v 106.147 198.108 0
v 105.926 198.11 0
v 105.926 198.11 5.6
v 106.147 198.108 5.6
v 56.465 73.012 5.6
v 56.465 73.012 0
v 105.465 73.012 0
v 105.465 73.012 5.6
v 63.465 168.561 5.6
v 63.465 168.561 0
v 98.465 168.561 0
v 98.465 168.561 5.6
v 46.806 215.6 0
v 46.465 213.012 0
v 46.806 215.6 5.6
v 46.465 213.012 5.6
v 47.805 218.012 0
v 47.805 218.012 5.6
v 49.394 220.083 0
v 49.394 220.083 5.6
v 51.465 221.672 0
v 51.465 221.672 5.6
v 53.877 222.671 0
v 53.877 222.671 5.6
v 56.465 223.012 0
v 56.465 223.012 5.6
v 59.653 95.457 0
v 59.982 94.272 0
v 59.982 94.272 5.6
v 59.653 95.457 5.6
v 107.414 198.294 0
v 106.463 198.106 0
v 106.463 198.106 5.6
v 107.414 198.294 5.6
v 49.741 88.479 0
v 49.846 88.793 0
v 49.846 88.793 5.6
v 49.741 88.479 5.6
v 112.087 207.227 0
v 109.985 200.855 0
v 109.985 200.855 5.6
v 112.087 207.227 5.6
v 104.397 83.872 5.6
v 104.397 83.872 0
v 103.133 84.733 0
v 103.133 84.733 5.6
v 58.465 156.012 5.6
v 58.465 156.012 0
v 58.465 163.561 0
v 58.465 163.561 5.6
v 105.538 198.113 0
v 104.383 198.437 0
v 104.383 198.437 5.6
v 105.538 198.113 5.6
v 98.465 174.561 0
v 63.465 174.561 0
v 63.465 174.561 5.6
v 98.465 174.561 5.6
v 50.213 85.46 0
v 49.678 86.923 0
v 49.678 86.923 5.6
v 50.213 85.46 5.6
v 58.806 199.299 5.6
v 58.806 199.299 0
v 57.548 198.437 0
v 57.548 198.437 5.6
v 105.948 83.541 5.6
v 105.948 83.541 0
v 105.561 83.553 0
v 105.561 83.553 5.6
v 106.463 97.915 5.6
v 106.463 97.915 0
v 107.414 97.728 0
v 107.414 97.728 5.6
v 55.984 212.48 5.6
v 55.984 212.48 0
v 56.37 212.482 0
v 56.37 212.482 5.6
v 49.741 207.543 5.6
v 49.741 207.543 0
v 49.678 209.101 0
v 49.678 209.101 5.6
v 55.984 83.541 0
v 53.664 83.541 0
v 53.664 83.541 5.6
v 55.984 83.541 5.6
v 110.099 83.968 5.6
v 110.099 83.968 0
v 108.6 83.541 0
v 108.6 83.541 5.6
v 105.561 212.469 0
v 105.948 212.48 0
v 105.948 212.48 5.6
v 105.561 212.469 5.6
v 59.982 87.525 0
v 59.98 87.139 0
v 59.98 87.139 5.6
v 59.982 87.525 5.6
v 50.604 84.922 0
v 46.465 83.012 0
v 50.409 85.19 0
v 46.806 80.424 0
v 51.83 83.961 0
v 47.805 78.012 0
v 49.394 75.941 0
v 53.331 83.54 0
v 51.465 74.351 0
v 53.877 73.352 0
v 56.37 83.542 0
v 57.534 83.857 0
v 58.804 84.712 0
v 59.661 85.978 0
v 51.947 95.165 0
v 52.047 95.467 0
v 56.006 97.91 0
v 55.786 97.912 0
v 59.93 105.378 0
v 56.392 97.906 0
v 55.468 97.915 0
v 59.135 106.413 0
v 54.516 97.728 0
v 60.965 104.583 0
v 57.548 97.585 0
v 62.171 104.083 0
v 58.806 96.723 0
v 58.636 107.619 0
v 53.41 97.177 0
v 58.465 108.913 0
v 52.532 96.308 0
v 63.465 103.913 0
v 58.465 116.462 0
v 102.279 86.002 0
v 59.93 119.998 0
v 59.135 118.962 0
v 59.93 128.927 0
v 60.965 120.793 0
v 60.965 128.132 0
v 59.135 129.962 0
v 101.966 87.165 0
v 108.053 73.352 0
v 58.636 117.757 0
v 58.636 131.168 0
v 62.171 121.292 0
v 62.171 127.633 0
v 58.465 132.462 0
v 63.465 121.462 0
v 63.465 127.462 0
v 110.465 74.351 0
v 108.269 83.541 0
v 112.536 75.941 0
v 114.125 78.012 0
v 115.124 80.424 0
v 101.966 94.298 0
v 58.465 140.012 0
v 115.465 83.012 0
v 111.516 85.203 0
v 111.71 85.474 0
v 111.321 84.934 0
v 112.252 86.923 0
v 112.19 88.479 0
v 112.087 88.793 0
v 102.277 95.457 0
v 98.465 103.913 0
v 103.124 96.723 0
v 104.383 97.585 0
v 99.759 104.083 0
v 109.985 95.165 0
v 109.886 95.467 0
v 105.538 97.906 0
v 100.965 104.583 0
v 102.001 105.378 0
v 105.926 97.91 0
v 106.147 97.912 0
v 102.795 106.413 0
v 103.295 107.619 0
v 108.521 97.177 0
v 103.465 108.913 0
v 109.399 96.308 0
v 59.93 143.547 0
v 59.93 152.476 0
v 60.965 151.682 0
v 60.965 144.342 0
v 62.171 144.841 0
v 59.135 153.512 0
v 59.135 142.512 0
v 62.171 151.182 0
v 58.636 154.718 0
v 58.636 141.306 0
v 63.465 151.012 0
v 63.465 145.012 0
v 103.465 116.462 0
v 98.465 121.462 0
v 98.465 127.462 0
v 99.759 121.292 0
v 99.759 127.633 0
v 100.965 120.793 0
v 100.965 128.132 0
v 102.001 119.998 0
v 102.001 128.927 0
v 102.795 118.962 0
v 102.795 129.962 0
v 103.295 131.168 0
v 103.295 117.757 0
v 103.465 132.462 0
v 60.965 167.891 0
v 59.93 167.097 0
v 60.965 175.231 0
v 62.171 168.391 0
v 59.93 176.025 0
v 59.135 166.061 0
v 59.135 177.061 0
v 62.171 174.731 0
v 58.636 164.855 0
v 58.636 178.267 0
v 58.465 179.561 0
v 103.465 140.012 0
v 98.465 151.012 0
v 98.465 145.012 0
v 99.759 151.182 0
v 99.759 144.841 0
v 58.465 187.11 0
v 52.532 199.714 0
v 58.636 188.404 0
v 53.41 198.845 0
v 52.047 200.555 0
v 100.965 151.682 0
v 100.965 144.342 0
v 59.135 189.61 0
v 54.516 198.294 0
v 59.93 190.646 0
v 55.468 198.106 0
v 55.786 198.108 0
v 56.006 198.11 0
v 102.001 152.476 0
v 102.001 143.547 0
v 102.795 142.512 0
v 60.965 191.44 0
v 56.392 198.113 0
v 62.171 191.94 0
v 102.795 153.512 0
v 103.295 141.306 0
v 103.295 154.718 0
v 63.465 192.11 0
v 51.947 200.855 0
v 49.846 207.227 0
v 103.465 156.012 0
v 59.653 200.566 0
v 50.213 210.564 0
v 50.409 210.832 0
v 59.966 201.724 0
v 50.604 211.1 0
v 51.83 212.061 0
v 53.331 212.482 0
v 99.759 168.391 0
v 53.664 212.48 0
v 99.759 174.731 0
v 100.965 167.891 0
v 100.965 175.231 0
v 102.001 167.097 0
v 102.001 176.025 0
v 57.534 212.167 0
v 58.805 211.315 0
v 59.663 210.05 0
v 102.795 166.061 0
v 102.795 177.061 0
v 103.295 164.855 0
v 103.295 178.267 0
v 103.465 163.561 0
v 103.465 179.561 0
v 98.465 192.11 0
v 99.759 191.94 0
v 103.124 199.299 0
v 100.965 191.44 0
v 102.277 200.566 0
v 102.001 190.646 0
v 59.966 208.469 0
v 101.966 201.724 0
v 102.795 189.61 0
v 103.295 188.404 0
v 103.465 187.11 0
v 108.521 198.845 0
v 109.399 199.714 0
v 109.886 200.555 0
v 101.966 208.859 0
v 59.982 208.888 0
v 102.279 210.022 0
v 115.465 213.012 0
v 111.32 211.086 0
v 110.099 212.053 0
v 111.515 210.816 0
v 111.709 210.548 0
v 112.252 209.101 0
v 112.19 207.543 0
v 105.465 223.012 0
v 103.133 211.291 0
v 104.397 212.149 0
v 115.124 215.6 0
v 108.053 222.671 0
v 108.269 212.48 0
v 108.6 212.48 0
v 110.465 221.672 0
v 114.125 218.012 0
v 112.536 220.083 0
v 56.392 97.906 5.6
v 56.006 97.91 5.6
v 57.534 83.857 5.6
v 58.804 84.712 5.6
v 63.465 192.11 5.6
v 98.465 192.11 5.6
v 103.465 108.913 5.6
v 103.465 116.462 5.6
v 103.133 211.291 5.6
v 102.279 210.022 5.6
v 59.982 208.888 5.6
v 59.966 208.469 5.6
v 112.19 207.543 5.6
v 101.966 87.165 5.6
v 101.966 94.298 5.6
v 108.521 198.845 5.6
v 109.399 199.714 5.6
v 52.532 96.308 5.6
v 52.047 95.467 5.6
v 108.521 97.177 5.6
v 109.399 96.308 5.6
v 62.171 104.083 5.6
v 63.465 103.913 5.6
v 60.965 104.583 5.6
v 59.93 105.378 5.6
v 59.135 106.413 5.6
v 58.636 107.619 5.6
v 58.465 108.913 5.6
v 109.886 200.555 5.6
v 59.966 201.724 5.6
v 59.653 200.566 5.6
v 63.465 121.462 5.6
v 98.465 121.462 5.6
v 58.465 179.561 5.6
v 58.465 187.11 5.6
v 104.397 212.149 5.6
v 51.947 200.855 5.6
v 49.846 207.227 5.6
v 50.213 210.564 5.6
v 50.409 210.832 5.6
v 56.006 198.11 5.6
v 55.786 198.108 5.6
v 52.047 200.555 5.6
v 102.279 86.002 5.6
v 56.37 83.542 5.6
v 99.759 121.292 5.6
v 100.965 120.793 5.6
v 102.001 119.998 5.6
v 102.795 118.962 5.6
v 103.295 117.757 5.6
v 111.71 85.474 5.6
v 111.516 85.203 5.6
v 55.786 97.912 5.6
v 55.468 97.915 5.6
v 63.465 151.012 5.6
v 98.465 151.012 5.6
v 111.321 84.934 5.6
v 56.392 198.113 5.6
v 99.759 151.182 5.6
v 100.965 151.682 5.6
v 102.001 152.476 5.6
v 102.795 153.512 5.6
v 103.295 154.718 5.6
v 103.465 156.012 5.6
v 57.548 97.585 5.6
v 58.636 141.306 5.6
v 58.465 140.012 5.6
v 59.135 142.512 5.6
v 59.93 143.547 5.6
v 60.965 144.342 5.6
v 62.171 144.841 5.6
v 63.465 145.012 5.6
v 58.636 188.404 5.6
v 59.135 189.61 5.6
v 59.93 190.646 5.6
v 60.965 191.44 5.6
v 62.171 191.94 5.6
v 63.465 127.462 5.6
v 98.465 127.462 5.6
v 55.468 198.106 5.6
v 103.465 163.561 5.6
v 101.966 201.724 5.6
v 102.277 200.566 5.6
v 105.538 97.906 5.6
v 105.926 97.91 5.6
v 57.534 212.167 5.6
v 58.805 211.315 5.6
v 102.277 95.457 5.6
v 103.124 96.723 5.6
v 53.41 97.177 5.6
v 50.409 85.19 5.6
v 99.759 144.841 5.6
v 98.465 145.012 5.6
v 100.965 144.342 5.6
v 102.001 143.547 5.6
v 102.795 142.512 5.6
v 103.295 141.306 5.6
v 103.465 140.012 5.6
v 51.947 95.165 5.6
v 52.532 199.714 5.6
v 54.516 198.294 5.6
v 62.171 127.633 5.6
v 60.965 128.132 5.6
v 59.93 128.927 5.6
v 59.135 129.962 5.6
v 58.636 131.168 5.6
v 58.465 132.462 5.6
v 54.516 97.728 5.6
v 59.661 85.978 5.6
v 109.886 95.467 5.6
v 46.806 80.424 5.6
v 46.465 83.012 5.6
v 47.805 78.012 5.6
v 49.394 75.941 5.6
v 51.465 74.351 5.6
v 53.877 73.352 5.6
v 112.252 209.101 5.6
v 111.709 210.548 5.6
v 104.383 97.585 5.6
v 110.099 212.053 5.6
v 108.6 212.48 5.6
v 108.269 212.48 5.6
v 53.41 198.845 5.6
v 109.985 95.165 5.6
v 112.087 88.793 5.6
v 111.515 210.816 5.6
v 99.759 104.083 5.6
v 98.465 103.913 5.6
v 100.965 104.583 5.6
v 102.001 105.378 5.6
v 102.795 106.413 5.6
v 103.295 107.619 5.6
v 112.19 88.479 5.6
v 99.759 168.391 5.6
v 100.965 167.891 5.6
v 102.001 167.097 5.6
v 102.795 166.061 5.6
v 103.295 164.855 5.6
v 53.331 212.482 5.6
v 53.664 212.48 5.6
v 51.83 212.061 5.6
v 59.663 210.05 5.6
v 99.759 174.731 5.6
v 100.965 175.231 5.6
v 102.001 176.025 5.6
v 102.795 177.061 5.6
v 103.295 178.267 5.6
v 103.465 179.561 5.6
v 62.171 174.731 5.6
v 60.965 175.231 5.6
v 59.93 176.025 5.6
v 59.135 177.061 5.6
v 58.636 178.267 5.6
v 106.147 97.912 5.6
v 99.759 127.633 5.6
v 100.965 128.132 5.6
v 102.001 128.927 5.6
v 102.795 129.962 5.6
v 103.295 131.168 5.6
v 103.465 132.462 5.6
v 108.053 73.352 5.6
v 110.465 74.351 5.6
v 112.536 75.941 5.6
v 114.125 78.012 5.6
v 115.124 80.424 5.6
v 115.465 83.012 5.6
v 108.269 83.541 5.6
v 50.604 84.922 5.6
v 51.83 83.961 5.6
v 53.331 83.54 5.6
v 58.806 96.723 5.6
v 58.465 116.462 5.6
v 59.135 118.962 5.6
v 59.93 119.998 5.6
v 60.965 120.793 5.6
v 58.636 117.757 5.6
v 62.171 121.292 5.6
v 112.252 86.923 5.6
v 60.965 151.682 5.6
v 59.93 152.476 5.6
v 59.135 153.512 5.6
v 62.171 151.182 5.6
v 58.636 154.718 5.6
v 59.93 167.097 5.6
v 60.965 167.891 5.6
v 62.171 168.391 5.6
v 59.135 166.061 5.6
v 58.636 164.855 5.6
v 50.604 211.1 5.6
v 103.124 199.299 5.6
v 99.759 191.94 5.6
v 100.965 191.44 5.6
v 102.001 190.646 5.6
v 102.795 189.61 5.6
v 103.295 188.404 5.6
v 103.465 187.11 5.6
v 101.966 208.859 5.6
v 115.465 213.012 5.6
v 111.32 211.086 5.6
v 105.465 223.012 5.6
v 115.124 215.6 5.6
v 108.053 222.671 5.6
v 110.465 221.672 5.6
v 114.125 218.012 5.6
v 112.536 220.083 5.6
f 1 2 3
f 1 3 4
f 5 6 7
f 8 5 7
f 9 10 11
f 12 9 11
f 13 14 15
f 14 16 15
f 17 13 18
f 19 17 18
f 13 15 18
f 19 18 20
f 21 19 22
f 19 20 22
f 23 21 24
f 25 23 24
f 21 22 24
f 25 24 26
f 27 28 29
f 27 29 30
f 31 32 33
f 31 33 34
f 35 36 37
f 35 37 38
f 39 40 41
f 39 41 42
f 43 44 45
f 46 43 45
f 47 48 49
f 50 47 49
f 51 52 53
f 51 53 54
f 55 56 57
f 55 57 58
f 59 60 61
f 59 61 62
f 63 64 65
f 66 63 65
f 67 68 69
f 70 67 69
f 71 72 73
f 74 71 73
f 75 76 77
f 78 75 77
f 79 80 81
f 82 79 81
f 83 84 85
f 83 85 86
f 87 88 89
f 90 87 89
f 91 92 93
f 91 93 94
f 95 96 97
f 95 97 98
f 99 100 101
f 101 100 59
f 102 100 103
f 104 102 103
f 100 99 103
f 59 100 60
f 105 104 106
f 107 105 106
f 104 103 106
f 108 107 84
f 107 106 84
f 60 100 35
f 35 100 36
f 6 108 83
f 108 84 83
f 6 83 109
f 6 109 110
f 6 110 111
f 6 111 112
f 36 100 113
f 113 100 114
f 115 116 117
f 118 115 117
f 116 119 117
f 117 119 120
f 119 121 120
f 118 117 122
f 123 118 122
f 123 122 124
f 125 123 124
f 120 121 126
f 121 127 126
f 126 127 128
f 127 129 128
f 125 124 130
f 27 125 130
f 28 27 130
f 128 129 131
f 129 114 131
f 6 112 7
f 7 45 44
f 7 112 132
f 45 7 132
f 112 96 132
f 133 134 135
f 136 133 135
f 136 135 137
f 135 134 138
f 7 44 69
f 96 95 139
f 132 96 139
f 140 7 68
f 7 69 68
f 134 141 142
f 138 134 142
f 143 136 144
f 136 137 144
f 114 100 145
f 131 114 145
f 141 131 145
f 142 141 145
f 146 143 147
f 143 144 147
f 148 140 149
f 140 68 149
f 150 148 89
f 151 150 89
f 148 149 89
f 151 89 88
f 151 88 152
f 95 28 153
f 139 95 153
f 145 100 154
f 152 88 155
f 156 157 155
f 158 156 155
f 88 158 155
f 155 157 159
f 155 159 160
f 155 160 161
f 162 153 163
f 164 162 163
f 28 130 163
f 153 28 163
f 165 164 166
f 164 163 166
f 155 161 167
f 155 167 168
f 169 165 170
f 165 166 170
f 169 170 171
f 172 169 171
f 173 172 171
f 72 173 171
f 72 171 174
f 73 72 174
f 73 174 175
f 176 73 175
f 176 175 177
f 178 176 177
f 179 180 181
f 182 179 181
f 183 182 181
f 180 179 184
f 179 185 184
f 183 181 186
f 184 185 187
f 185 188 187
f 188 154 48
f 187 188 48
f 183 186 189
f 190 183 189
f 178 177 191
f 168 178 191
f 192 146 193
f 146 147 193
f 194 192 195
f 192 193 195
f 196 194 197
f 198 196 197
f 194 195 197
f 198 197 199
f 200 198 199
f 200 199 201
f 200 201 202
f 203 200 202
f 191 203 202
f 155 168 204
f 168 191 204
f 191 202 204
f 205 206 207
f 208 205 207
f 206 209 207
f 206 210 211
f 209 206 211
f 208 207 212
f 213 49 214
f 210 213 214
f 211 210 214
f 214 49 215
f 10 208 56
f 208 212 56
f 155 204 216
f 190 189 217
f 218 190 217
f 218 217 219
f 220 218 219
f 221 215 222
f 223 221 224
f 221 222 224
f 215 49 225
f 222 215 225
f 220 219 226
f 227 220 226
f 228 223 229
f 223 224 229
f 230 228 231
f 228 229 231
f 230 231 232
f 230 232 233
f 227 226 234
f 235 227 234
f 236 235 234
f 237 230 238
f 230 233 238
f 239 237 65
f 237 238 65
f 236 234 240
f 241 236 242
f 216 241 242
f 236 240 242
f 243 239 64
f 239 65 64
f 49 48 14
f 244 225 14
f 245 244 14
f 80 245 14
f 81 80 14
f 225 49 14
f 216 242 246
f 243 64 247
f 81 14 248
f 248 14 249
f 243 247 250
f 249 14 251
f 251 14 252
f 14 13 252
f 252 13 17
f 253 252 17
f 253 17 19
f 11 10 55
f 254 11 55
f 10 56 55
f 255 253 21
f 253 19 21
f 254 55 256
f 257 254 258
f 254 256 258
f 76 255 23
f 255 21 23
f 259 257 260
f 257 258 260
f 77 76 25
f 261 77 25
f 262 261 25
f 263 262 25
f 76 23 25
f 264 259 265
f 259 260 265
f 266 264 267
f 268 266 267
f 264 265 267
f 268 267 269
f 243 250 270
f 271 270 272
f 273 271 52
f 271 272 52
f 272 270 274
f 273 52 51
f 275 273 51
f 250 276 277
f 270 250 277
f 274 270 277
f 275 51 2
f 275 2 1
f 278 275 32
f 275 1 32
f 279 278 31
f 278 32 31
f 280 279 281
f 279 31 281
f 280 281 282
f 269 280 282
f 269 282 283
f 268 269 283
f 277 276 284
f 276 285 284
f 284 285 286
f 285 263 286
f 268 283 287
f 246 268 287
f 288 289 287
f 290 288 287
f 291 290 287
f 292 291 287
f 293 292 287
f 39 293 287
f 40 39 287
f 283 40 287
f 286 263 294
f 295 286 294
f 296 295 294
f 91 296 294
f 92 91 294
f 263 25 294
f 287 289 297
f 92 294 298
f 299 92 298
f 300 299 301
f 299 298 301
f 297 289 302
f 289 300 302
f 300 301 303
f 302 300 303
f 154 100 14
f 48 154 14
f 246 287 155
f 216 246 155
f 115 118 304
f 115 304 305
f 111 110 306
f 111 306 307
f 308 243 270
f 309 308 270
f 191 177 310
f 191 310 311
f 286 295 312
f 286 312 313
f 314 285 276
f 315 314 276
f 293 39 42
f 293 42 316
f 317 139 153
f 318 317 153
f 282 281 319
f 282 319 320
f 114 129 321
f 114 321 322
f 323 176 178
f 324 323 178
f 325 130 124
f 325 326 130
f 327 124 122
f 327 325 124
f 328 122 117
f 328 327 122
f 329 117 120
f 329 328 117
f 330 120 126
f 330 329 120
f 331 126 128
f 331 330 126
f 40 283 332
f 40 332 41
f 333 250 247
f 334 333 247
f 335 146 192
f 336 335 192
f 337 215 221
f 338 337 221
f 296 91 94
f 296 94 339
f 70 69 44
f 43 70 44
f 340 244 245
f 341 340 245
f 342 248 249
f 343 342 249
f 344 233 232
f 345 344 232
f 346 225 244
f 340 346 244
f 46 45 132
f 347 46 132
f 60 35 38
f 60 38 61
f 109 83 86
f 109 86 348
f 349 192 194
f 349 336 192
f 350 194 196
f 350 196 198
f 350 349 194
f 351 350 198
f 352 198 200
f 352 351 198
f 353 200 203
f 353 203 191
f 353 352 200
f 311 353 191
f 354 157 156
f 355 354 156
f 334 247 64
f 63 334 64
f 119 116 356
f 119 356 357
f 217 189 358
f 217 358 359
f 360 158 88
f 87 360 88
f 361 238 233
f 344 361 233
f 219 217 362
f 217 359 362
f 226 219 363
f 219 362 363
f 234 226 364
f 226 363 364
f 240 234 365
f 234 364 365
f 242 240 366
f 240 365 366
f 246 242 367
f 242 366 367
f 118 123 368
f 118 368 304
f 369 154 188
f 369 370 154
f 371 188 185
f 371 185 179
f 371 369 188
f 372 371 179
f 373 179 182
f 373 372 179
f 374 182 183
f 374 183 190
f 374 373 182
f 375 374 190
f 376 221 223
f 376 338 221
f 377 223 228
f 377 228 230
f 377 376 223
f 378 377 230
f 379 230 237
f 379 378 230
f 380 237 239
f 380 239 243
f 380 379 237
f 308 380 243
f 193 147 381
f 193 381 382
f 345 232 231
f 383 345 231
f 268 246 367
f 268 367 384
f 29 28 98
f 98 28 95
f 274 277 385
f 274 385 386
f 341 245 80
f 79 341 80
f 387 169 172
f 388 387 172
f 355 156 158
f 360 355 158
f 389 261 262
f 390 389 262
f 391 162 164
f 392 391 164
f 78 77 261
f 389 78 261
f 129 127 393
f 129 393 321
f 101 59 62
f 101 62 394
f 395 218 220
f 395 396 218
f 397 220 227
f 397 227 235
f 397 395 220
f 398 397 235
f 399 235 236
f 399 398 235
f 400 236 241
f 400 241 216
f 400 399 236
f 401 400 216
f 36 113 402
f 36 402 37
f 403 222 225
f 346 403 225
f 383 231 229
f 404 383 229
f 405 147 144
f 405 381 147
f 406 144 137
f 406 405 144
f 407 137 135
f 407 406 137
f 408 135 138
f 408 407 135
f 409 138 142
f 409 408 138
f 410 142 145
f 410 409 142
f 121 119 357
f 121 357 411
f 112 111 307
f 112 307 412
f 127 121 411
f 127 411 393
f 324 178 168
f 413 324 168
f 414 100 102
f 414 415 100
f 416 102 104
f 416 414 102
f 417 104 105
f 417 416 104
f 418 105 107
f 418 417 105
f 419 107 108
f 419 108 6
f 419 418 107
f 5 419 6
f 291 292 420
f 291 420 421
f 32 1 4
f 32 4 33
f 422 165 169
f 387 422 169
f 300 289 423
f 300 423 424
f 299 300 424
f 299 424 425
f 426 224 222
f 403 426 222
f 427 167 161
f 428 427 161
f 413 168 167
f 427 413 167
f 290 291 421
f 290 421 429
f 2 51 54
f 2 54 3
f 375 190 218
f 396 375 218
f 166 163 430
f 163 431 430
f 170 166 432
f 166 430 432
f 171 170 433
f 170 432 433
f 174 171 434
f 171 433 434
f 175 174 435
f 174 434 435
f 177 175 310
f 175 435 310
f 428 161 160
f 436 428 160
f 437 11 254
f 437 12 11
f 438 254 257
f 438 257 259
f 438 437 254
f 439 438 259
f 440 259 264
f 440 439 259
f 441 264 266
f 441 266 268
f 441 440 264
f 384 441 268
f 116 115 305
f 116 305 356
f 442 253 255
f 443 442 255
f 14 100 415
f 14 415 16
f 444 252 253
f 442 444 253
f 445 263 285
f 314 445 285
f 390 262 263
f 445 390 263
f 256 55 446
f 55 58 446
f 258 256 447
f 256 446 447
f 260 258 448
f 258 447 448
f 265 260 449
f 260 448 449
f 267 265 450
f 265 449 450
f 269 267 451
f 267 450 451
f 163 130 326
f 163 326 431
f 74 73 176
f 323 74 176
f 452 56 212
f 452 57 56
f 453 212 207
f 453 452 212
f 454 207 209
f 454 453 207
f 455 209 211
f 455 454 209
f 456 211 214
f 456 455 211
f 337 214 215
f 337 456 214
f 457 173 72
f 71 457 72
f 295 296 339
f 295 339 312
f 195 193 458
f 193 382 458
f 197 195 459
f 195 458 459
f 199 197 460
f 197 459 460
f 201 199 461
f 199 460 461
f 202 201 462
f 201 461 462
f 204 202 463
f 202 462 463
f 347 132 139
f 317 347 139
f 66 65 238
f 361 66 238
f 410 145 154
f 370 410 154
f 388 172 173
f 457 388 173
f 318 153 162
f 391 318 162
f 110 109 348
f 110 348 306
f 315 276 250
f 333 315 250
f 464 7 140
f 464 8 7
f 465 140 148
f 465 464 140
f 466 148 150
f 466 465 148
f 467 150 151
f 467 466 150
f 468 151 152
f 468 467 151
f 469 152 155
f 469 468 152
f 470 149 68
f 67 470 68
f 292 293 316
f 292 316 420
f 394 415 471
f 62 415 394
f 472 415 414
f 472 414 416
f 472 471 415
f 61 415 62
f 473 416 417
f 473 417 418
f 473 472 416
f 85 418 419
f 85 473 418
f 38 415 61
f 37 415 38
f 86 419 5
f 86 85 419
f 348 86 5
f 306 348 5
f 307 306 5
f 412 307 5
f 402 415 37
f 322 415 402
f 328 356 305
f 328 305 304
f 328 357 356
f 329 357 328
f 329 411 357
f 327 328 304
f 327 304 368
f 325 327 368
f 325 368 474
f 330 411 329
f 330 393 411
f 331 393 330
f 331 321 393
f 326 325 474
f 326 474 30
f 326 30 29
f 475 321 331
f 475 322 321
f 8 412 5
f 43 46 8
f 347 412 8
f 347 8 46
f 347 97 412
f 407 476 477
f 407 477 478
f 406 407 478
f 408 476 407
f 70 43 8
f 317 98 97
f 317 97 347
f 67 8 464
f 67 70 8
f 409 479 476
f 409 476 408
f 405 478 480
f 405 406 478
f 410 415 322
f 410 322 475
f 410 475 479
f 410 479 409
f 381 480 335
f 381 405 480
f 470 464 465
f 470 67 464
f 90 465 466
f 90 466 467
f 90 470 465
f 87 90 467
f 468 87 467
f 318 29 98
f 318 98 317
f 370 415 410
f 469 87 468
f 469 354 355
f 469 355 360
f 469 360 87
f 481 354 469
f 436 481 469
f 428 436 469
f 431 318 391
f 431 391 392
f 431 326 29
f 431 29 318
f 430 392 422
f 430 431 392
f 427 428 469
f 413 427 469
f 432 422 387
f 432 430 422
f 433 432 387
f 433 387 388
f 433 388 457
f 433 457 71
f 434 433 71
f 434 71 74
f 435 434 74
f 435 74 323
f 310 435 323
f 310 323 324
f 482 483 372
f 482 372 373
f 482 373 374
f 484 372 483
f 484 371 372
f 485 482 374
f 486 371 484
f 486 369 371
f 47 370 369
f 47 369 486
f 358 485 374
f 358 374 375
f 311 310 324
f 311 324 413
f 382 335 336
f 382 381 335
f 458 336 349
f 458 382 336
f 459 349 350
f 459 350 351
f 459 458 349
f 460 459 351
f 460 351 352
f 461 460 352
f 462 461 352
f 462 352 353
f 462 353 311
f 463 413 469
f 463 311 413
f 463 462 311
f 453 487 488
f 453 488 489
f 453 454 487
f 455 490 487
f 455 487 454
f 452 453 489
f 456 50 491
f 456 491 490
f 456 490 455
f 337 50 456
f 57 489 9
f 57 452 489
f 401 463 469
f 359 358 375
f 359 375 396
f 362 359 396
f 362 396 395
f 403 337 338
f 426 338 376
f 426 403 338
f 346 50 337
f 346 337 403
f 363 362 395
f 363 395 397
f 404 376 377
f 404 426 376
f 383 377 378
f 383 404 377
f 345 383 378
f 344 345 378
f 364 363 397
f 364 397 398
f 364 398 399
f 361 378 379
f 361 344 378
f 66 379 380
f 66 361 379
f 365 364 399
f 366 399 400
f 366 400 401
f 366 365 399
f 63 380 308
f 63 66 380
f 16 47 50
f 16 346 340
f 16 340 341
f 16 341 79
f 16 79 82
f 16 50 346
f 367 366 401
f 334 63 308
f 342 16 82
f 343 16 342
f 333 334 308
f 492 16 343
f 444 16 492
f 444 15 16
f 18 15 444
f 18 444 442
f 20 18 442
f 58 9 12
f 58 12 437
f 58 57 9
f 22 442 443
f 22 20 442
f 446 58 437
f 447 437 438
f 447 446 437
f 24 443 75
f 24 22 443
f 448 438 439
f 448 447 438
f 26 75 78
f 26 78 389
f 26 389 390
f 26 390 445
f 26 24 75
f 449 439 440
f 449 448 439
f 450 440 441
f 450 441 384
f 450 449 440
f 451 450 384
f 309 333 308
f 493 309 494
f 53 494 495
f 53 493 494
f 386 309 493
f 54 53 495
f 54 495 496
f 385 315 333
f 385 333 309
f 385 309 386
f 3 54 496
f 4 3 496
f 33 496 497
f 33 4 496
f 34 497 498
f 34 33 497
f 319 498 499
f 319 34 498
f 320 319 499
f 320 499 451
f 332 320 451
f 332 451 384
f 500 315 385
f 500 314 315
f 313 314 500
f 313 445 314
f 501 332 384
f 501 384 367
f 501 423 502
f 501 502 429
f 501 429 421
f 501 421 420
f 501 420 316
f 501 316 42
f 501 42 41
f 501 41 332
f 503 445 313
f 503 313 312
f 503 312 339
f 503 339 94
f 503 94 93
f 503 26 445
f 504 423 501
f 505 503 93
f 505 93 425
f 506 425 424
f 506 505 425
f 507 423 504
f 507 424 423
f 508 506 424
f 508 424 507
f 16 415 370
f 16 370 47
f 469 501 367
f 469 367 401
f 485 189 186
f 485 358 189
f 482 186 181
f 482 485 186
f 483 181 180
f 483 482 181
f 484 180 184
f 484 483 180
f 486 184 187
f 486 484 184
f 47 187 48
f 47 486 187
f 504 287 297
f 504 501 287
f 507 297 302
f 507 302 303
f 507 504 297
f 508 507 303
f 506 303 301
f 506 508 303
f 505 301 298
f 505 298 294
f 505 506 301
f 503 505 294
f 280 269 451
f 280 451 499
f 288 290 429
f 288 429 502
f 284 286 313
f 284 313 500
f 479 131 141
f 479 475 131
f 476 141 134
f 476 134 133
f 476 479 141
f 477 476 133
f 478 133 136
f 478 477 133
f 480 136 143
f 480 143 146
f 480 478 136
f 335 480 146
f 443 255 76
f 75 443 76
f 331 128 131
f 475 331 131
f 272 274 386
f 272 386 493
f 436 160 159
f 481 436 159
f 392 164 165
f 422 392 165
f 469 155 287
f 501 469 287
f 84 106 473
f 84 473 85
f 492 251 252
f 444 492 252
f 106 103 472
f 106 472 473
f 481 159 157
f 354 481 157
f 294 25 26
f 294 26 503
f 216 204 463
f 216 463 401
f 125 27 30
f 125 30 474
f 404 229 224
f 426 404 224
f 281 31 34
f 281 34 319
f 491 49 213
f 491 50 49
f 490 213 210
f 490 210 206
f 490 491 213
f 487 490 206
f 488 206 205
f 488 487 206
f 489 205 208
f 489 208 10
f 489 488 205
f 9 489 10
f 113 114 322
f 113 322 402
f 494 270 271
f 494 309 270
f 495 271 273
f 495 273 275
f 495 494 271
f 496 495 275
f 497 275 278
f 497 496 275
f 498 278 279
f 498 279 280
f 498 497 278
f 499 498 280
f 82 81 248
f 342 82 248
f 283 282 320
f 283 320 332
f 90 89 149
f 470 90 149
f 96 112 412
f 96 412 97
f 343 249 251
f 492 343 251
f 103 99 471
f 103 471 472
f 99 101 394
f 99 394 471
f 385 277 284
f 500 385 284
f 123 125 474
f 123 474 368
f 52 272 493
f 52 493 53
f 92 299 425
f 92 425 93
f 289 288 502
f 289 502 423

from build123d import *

# Parameters (mm, degrees)
MODEL_W             = 69
MODEL_H             = 150
MODEL_W_2           = 45
MODEL_H_2           = 17.549304405
MODEL_H_3           = 17.549304404
BOSS_EXTRUDE1_DEPTH = 5.6
FILLET1_R           = 10
FILLET2_R           = 5


with BuildPart() as part:
    # Model → Boss-Extrude1 (new body)
    with BuildSketch(Plane.XY):
        with Locations((80.965167, 148.011716788)):
            Rectangle(MODEL_W, MODEL_H)
        with Locations((80.965167, 159.786368991)):
            Rectangle(MODEL_W_2, MODEL_H_2, mode=Mode.SUBTRACT)
        with Locations((80.965167, 183.335673395)):
            Rectangle(MODEL_W_2, MODEL_H_3, mode=Mode.SUBTRACT)
        with Locations((80.965167, 136.237064586)):
            Rectangle(MODEL_W_2, MODEL_H_3, mode=Mode.SUBTRACT)
        with Locations((80.965167, 112.687760182)):
            Rectangle(MODEL_W_2, MODEL_H_3, mode=Mode.SUBTRACT)
        Polygon((105.926079426, 198.110325597), (106.146551371, 198.108293598), (106.462865959, 198.106261598), (107.414180388, 198.293544218), (108.520604111, 198.844893414), (109.398766558, 199.71425053), (109.885769103, 200.555498319), (109.984998412, 200.855218244), (112.087101886, 207.226891318), (112.190056527, 207.542867239), (112.252032512, 209.101410849), (111.70865689, 210.547690825), (111.515176602, 210.816482466), (111.320006162, 211.085959339), (110.098534463, 212.052809224), (108.599544612, 212.48043722), (108.269000143, 212.479948671), (105.948092754, 212.479948671), (105.560658184, 212.469111341), (104.397338475, 212.149410087), (103.133434791, 211.291228969), (102.278640338, 210.021906619), (101.96638975, 208.85858691), (101.96638975, 208.469120341), (101.96638975, 202.110316597), (101.96638975, 201.723898027), (102.276947005, 200.56633565), (103.123952127, 199.298706633), (104.382775812, 198.437138849), (105.53830619, 198.113373596), align=None, mode=Mode.SUBTRACT)
        Polygon((56.006286573, 198.110325597), (55.786153295, 198.108293598), (55.468145374, 198.106261598), (54.515814946, 198.293544218), (53.410068555, 198.844893414), (52.531906108, 199.71425053), (52.046596896, 200.555498319), (51.947367588, 200.855218244), (49.84560278, 207.226891318), (49.740954806, 207.542867239), (49.678301488, 209.101410849), (50.213056021, 210.56377315), (50.409482639, 210.831658417), (50.604215924, 211.100221016), (51.829850284, 212.061356776), (53.331159242, 212.481980671), (53.663729825, 212.479948671), (55.983959888, 212.479948671), (56.37003558, 212.481751973), (57.534497197, 212.167486259), (58.804766127, 211.315229016), (59.662770703, 210.049900432), (59.982483497, 208.888061364), (59.965637583, 208.469120341), (59.965637583, 202.110316597), (59.965637583, 201.723898027), (59.653386995, 200.56633565), (58.806381873, 199.298706633), (57.547896854, 198.437138849), (56.392366477, 198.113373596), align=None, mode=Mode.SUBTRACT)
        Polygon((105.926079426, 97.910059981), (106.146551371, 97.911753313), (106.462865959, 97.915478646), (107.414180388, 97.727857359), (108.520604111, 97.177185497), (109.398766558, 96.307828381), (109.885769103, 95.466580591), (109.984998412, 95.164828667), (112.087101886, 88.792816927), (112.190056527, 88.478534338), (112.252032512, 86.922700061), (111.709769882, 85.473734765), (111.516141042, 85.203024117), (111.320811964, 84.933999869), (110.098774764, 83.968201755), (108.599536956, 83.541110091), (108.268994213, 83.541452906), (105.948092754, 83.541452906), (105.560658184, 83.55296757), (104.397338475, 83.872330157), (103.133434791, 84.732543275), (102.278640338, 86.002204291), (101.96638975, 87.164846667), (101.96638975, 87.55092657), (101.96638975, 93.910068981), (101.96638975, 94.29750355), (102.276947005, 95.457097927), (103.123952127, 96.723372277), (104.382775812, 97.584940062), (105.53830619, 97.906334648), align=None, mode=Mode.SUBTRACT)
        Polygon((56.006286573, 97.910059981), (55.786153295, 97.911753313), (55.468145374, 97.915478646), (54.515814946, 97.727857359), (53.410068555, 97.177185497), (52.531906108, 96.307828381), (52.046596896, 95.466580591), (51.947367588, 95.164828667), (49.84560278, 88.792816927), (49.740954806, 88.478534338), (49.678301488, 86.922700061), (50.213056021, 85.459660426), (50.409482639, 85.189743161), (50.604215924, 84.921519228), (51.829850284, 83.960722135), (53.331159242, 83.539759573), (53.663729825, 83.541452906), (55.983953956, 83.541452906), (56.37003894, 83.541906995), (57.534315492, 83.856513857), (58.804094924, 84.711544578), (59.661361982, 85.977712552), (59.980393619, 87.139060758), (59.981971512, 87.525137437), (59.981971512, 93.884279847), (59.981971512, 94.271714417), (59.653386995, 95.457097927), (58.806381873, 96.723372277), (57.547896854, 97.584940062), (56.392366477, 97.906334648), align=None, mode=Mode.SUBTRACT)
    extrude(amount=BOSS_EXTRUDE1_DEPTH)

    # Fillet1
    fillet1_edges = [part.edges().sort_by_distance(p)[0] for p in [
        (115.465167, 73.011716788, 2.8),
        (46.465167, 73.011716788, 2.8),
        (46.465167, 223.011716788, 2.8),
        (115.465167, 223.011716788, 2.8),
    ]]
    fillet(fillet1_edges, radius=FILLET1_R)

    # Fillet2
    fillet2_edges = [part.edges().sort_by_distance(p)[0] for p in [
        (58.465167, 192.110325597, 2.8),
        (58.465167, 174.561021193, 2.8),
        (103.465167, 174.561021193, 2.8),
        (103.465167, 192.110325597, 2.8),
        (58.465167, 168.561021193, 2.8),
        (58.465167, 151.011716788, 2.8),
        (103.465167, 151.011716788, 2.8),
        (103.465167, 168.561021193, 2.8),
        (58.465167, 127.462412384, 2.8),
        (103.465167, 127.462412384, 2.8),
        (103.465167, 145.011716788, 2.8),
        (58.465167, 145.011716788, 2.8),
        (58.465167, 103.91310798, 2.8),
        (103.465167, 103.91310798, 2.8),
        (103.465167, 121.462412384, 2.8),
        (58.465167, 121.462412384, 2.8),
    ]]
    fillet(fillet2_edges, radius=FILLET2_R)


solid = part.part
